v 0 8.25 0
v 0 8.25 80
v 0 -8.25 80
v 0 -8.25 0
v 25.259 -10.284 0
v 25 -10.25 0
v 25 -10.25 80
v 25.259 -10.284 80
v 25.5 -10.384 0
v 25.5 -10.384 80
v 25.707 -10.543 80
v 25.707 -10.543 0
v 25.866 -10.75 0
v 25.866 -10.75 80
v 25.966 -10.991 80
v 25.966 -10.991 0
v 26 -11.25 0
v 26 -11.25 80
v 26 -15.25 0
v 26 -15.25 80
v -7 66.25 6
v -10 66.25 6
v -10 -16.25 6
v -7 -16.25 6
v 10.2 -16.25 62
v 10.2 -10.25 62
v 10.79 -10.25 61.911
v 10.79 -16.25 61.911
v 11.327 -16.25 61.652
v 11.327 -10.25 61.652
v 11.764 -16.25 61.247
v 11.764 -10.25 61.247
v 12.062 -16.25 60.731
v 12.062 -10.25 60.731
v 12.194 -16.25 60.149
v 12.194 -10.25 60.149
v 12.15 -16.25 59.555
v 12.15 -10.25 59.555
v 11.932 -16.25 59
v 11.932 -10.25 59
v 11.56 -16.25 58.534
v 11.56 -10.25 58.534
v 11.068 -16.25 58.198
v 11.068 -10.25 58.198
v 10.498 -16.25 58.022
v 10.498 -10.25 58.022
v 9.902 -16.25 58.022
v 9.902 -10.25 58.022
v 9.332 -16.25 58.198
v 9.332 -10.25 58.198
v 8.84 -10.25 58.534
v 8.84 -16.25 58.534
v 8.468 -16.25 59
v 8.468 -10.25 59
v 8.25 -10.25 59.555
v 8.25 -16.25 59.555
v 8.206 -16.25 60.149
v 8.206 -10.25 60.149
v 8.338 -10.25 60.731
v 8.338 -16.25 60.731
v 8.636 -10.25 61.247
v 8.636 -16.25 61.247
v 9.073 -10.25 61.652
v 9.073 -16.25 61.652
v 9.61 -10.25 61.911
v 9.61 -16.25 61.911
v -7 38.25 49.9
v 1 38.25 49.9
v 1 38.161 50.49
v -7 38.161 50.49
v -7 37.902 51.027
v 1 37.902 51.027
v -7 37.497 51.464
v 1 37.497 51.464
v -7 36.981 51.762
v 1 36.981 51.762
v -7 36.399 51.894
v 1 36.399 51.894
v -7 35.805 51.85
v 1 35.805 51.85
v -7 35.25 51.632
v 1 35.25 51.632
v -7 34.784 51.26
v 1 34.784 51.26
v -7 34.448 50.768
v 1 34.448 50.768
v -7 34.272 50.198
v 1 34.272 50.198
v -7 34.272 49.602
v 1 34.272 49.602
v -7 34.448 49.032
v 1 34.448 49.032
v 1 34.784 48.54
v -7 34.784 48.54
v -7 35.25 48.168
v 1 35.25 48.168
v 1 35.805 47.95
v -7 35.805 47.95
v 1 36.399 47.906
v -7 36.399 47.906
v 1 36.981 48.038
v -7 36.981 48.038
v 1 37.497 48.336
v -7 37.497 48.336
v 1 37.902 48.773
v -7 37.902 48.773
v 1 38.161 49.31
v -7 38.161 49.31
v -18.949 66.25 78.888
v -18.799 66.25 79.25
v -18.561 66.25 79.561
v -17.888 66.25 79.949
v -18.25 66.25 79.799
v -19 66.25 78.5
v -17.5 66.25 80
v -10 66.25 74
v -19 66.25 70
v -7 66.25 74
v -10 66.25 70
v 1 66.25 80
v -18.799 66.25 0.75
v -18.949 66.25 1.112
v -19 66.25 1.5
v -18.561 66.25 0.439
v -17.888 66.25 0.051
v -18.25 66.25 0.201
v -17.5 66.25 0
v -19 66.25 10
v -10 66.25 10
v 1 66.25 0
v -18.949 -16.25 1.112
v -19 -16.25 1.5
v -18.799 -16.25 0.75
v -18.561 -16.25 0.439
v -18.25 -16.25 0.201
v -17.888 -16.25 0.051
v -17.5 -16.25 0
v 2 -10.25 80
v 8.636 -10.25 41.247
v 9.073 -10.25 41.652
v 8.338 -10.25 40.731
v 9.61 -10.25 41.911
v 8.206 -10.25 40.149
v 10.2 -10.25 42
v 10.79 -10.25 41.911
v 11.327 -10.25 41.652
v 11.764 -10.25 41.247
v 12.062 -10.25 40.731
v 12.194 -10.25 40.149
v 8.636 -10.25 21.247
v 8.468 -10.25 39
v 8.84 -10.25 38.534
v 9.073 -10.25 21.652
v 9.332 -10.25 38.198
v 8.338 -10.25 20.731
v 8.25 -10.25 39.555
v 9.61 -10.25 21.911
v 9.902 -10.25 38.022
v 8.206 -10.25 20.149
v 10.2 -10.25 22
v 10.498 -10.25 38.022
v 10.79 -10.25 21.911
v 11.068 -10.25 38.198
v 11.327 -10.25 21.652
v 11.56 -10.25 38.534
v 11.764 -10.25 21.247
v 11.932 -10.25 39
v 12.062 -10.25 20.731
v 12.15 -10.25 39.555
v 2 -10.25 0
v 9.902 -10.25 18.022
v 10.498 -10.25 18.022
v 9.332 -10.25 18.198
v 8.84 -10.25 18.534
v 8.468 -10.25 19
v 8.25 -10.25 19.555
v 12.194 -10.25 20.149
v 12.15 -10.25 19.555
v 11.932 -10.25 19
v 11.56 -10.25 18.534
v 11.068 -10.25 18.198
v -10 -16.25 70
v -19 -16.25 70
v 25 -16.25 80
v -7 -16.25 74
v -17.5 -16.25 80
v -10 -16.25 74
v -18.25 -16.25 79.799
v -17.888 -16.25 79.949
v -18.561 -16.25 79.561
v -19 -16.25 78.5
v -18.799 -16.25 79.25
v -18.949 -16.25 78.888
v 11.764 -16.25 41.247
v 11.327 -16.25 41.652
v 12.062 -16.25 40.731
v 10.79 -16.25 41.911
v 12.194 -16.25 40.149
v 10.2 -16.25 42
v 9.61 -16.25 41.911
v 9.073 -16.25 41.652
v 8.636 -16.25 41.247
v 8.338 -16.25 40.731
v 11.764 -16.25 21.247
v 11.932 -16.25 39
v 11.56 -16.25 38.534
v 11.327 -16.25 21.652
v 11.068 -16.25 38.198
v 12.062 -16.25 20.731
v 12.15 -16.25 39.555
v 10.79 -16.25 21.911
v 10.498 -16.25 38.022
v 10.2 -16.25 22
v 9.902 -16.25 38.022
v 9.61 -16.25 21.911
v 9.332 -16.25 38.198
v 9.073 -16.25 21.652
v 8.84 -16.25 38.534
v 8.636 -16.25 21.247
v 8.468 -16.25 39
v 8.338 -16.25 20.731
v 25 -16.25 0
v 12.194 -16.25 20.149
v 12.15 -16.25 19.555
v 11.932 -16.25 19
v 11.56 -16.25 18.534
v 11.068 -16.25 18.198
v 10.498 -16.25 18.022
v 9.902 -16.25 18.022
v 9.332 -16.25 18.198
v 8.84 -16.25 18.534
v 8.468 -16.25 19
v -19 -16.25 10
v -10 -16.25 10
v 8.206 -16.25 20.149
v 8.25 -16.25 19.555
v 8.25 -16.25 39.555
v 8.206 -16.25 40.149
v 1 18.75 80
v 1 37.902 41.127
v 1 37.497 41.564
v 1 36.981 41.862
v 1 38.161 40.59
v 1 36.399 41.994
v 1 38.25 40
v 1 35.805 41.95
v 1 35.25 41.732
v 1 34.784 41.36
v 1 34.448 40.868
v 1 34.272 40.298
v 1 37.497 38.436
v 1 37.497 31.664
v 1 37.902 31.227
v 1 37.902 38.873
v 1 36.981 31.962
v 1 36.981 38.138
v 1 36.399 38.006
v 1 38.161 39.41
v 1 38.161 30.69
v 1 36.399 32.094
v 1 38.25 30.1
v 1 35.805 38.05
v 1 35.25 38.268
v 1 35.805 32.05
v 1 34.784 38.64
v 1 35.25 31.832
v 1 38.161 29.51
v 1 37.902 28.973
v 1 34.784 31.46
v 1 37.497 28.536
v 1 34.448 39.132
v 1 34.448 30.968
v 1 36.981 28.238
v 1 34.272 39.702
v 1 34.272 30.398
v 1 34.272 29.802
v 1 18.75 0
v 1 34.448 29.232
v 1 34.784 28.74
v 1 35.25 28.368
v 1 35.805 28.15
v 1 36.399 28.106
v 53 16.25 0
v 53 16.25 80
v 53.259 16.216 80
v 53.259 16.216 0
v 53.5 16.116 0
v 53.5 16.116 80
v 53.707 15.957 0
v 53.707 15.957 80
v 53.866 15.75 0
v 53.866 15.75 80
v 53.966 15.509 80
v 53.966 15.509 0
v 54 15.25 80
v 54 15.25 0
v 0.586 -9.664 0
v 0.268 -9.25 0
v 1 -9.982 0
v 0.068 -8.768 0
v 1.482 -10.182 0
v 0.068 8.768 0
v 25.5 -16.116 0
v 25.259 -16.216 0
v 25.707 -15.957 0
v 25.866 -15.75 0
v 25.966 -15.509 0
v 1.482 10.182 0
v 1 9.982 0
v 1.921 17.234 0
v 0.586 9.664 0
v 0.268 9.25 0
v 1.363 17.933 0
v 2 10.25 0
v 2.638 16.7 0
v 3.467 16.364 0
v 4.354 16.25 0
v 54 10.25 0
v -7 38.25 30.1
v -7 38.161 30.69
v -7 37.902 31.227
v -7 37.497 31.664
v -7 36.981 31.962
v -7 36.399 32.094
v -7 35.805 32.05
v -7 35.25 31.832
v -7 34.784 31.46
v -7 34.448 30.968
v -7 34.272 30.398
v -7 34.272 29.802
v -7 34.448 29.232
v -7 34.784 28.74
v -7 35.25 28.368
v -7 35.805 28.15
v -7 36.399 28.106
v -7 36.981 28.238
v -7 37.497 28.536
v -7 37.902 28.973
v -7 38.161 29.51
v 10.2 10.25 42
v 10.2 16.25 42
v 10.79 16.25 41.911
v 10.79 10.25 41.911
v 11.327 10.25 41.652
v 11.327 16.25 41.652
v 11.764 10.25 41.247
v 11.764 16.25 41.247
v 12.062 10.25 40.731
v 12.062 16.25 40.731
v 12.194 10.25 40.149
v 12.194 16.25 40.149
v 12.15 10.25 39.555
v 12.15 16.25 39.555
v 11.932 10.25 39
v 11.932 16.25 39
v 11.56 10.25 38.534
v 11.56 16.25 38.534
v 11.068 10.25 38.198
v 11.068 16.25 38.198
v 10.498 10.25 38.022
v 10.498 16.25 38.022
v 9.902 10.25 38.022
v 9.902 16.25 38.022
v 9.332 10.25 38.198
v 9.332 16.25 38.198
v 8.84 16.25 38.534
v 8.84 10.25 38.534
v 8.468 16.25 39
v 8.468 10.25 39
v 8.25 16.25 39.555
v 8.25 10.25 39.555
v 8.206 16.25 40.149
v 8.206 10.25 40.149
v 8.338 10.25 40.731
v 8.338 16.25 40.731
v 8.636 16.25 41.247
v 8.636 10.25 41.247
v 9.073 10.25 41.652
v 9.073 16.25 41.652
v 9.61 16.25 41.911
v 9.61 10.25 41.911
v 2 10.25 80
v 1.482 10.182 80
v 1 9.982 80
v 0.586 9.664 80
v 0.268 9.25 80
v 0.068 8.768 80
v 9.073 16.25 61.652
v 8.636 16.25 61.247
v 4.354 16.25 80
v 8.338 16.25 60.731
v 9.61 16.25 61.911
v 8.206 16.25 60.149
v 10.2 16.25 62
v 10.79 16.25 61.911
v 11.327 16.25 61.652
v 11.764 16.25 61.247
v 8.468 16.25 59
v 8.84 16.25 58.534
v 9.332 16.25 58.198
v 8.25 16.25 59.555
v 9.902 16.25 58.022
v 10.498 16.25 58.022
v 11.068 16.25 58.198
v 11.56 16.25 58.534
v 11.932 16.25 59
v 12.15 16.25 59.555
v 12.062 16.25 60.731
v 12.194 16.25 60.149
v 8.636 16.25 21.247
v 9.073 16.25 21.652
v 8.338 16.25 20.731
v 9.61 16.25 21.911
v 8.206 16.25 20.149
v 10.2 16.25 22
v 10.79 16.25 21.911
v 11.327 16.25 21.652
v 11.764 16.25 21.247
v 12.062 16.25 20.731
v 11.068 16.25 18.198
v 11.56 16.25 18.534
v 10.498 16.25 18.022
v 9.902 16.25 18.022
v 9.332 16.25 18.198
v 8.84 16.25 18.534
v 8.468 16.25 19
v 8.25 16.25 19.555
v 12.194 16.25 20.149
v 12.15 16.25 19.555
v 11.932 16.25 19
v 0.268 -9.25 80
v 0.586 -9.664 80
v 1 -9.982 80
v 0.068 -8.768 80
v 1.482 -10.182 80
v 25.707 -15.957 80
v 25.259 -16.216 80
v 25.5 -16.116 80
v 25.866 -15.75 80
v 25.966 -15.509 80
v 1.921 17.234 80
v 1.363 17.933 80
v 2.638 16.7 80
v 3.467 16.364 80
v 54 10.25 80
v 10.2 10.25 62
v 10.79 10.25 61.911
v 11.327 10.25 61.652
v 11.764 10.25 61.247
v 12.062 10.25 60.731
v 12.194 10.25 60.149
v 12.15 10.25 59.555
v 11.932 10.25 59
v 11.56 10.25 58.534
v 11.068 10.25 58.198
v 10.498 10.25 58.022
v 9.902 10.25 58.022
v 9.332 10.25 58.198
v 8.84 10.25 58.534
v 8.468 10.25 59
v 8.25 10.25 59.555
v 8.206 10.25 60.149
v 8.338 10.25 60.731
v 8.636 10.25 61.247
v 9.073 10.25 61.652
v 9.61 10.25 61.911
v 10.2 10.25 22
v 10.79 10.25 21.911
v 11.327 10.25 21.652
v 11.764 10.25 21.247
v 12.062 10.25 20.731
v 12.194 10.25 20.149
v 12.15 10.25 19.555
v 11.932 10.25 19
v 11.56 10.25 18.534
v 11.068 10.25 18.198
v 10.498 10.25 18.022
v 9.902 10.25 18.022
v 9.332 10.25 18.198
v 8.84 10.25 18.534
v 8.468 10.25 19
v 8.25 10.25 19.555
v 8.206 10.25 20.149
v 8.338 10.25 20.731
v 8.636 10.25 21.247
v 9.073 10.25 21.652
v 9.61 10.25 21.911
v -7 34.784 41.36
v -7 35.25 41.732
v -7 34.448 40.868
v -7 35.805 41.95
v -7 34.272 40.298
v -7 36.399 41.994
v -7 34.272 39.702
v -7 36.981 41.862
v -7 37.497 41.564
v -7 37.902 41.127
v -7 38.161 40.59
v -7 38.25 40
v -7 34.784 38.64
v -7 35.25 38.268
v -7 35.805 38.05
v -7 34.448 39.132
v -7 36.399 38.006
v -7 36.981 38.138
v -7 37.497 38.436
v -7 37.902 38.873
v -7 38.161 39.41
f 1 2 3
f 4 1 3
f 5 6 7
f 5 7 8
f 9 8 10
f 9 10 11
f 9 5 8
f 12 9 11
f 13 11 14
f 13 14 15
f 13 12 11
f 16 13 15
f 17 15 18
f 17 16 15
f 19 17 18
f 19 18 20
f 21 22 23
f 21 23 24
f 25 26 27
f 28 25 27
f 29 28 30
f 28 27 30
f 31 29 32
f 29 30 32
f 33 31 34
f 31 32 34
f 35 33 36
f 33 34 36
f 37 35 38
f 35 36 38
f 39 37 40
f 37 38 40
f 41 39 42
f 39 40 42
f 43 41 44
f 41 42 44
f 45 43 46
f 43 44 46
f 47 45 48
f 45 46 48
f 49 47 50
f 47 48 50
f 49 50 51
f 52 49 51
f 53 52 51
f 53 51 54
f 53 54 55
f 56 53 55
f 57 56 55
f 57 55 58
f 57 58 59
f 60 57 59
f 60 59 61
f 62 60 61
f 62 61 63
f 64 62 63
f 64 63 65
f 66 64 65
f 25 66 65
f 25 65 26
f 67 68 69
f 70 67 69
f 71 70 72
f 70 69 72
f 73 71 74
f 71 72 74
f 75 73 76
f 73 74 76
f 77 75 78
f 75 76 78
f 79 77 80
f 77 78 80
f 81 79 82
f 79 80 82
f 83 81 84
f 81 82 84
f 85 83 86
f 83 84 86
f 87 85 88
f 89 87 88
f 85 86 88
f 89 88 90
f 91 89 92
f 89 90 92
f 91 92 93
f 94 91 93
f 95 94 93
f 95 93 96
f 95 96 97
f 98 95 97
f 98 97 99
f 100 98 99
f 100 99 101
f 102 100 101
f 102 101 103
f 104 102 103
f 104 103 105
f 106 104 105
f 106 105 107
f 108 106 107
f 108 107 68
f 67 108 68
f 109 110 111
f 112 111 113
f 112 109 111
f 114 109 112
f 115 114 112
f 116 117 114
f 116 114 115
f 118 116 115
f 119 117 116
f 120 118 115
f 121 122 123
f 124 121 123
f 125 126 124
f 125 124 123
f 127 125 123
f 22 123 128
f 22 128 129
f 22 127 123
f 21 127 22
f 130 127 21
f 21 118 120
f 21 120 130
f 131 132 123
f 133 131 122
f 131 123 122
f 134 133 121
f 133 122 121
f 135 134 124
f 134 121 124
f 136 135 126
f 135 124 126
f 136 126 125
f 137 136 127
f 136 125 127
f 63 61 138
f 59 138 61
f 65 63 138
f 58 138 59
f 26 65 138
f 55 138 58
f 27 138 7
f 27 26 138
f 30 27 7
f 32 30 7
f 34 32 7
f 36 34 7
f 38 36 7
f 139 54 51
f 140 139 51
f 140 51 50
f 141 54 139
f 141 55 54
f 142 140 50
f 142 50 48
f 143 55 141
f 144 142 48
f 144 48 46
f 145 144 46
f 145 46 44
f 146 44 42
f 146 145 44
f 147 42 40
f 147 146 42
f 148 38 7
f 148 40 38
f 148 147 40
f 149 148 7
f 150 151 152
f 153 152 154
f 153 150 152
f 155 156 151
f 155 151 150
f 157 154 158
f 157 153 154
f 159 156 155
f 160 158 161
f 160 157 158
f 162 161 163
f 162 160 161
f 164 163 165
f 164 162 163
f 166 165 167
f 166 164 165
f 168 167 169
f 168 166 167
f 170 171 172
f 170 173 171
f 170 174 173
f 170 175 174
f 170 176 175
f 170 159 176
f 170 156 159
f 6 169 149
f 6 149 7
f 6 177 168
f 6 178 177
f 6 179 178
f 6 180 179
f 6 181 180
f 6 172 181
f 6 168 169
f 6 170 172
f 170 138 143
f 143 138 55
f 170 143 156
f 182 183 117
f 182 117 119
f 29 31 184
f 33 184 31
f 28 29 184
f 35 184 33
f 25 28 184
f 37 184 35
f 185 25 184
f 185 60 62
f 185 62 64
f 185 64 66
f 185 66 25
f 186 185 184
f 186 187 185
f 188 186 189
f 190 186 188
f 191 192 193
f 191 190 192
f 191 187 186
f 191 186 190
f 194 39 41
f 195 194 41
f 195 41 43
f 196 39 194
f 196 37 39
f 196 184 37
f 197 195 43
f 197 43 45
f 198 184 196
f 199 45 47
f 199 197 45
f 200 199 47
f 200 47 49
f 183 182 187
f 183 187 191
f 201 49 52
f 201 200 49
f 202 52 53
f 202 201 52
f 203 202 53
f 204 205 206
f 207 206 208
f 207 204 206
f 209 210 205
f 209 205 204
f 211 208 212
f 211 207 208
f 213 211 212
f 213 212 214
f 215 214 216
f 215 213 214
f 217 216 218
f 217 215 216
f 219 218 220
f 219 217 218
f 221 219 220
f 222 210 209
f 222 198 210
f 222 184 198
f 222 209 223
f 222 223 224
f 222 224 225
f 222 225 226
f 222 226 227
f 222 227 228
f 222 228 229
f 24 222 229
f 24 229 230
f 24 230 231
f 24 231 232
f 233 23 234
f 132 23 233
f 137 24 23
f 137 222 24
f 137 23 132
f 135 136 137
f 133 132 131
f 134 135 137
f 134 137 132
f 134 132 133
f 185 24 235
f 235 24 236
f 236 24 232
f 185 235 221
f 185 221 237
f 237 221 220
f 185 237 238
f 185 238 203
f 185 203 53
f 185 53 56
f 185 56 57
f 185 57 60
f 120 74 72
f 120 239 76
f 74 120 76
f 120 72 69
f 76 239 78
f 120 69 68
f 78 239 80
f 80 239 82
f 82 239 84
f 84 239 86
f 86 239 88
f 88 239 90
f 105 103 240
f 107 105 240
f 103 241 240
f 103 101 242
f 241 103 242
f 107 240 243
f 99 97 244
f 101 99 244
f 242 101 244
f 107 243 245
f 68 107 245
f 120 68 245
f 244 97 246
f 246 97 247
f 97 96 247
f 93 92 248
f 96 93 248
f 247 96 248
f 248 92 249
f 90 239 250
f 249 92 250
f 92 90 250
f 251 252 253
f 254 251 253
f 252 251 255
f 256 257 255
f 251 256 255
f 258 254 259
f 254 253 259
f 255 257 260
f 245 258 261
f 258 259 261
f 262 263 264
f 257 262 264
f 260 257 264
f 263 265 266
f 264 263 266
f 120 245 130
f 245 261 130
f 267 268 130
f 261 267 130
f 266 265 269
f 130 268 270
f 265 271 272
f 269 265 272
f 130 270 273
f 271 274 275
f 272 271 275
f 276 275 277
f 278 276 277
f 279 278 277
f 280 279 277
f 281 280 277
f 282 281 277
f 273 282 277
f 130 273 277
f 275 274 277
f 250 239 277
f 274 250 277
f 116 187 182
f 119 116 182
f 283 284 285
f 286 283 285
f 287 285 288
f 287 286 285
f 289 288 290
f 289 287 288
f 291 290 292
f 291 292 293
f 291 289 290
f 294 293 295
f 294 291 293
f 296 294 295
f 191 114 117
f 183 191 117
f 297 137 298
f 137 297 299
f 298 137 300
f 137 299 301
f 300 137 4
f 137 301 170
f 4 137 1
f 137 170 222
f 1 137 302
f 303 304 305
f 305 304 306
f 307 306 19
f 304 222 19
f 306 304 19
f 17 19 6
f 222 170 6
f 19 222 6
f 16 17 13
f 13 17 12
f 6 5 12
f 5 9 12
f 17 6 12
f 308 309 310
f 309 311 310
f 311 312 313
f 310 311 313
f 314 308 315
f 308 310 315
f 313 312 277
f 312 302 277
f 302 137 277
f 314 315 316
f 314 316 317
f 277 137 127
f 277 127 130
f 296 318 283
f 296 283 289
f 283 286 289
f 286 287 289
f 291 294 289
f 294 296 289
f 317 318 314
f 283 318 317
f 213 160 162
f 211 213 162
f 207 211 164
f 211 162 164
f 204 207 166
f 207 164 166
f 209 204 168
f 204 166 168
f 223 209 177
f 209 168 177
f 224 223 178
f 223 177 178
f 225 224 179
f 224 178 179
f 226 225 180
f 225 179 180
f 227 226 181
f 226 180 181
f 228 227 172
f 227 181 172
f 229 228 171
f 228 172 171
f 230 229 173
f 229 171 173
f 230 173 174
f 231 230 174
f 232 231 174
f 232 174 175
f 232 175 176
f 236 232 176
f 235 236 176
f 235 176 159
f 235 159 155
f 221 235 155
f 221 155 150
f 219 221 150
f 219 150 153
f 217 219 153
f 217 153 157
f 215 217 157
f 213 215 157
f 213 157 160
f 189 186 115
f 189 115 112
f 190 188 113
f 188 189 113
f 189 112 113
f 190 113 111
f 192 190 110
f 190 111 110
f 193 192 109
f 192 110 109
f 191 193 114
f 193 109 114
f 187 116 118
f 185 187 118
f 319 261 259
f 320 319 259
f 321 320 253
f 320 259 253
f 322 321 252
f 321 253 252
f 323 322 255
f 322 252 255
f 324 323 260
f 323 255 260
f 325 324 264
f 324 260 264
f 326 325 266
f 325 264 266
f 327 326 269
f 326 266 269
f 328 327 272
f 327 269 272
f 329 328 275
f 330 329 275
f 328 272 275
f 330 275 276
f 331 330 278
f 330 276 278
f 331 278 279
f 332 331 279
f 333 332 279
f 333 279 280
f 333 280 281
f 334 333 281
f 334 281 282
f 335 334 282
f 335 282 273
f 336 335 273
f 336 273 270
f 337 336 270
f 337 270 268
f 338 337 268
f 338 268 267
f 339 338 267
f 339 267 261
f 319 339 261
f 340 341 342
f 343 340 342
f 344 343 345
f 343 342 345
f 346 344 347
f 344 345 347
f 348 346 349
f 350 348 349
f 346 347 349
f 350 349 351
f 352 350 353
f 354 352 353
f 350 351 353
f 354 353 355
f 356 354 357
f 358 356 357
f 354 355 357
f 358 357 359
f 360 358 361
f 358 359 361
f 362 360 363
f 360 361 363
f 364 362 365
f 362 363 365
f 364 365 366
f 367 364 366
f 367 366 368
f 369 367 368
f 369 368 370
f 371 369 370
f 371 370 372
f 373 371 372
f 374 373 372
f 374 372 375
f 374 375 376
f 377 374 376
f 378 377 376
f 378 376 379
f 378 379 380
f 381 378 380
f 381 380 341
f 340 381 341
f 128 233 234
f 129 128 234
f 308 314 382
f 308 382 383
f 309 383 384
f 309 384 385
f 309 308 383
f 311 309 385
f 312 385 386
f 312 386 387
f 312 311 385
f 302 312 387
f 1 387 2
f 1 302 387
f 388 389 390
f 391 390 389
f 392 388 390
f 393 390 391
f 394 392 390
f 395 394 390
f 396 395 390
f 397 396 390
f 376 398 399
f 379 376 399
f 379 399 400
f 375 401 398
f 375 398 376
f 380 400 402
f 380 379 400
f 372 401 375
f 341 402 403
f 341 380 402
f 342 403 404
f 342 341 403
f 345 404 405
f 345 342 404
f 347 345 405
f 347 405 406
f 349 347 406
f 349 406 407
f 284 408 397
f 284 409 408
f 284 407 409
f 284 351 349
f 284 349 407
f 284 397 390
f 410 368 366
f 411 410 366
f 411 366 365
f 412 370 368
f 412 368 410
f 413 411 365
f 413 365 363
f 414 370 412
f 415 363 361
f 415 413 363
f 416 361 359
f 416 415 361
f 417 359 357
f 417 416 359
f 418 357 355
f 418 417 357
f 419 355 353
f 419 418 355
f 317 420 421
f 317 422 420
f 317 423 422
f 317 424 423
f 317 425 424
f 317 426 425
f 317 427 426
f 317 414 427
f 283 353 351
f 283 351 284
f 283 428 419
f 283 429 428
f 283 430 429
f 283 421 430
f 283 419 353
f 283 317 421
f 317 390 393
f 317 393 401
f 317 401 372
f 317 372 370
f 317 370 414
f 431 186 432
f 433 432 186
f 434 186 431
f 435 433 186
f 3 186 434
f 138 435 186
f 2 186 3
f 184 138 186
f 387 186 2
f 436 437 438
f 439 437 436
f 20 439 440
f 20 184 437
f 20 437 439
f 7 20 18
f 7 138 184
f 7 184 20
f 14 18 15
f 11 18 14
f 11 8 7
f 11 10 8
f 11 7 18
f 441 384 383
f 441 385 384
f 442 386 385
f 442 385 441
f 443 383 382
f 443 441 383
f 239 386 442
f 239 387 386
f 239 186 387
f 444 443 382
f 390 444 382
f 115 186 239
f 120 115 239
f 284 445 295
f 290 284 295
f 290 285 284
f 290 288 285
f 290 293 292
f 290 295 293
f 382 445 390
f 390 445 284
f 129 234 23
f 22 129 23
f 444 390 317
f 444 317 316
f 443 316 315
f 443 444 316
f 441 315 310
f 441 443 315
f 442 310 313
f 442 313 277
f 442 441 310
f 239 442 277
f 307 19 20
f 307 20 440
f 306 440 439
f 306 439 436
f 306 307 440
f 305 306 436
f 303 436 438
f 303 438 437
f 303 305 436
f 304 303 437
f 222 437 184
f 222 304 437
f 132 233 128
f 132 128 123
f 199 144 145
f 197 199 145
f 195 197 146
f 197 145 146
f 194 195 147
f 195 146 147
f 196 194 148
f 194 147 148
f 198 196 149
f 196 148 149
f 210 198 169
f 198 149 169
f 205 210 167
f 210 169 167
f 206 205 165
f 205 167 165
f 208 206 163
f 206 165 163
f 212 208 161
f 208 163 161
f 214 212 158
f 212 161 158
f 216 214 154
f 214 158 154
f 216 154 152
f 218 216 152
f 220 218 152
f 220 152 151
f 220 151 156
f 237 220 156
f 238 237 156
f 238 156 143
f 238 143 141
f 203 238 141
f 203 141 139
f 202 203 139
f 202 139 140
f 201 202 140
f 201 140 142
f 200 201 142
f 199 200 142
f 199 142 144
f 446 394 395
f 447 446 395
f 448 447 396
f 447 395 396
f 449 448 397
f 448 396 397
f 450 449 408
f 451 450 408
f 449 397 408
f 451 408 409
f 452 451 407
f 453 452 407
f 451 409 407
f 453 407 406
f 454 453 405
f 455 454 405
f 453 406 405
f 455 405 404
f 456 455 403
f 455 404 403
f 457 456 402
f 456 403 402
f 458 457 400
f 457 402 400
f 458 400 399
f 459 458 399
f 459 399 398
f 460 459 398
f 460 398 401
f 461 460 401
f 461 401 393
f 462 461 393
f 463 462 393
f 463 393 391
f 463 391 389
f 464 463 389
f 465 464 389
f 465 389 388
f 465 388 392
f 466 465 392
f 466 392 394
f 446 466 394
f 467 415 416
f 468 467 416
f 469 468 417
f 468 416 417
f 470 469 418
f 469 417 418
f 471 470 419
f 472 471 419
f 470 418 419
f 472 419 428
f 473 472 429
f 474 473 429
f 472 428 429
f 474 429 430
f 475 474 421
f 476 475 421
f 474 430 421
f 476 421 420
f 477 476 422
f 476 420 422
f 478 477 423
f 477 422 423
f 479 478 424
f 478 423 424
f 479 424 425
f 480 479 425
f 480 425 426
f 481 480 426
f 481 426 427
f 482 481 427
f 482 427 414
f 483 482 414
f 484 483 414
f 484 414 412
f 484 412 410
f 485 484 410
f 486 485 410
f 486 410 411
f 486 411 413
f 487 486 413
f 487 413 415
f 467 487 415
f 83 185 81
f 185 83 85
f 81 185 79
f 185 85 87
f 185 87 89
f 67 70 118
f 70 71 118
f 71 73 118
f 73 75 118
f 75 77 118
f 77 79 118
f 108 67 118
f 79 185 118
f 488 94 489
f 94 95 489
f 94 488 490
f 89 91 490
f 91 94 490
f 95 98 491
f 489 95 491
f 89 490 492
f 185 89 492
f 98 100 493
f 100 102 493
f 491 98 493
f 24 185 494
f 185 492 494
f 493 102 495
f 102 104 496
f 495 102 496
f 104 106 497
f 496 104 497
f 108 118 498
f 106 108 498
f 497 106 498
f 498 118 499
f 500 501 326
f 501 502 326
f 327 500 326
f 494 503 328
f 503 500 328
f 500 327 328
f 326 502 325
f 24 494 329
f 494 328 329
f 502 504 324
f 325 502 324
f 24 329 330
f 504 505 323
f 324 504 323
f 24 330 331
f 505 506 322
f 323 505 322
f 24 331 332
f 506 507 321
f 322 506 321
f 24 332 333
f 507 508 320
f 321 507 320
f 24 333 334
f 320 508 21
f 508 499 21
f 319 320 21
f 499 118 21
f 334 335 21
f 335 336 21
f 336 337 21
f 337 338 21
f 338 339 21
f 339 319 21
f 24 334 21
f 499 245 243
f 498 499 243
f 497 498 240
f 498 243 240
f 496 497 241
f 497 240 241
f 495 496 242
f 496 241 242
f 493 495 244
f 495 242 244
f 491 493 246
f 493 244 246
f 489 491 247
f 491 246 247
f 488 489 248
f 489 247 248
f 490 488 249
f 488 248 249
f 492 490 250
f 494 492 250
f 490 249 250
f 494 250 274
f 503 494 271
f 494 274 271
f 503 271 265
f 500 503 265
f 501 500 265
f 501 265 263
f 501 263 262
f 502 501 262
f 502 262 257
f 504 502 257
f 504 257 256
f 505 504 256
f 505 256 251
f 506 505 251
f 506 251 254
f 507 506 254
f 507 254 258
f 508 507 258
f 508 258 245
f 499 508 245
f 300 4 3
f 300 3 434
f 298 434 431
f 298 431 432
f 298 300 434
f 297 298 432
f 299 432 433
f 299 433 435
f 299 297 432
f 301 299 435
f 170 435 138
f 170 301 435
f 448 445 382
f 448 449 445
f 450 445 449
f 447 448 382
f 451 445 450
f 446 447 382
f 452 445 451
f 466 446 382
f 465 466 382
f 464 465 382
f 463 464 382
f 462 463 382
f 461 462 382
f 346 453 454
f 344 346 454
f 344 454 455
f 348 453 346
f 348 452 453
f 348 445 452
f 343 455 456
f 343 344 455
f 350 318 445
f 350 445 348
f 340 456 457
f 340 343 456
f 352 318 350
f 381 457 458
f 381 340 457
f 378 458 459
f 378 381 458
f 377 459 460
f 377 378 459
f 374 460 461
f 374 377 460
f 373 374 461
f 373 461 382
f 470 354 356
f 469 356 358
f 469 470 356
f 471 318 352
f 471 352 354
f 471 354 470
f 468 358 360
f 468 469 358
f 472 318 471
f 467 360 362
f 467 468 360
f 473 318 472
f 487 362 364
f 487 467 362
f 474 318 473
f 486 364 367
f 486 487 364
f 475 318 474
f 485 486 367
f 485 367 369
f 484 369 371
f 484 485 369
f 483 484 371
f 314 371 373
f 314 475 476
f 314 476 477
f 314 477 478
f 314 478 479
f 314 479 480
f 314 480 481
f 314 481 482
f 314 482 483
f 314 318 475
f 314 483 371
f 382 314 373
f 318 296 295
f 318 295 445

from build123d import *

# Parameters (mm, degrees)
BOSS_EXTRUDE2_DEPTH = 80
SKETCH3_R           = 2
CUT_EXTRUDE2_DEPTH  = 80
SKETCH4_W           = 20
SKETCH4_H           = 80
BOSS_EXTRUDE3_DEPTH = 50
BOSS_EXTRUDE4_DEPTH = 80
SKETCH6_W           = 12
SKETCH6_H           = 60
CUT_EXTRUDE4_DEPTH  = 90
SKETCH7_W           = 3
SKETCH7_H           = 68
CUT_EXTRUDE5_DEPTH  = 90
SKETCH9_R           = 2
CUT_EXTRUDE6_DEPTH  = 90
SKETCH11_R          = 2
CUT_EXTRUDE7_DEPTH  = 90


with BuildPart() as part:
    # Sketch1 → Boss-Extrude2 (new body)
    with BuildSketch(Plane.XY):
        with BuildLine():
            ThreePointArc((26, -15.25), (25.707106781, -15.957106781), (25, -16.25))
            Line((25, -16.25), (-19, -16.25))
            Line((-19, -16.25), (-19, 16.25))
            Line((-19, 16.25), (4, 16.25))
            Line((4, 16.25), (53, 16.25))
            ThreePointArc((53, 16.25), (53.707106781, 15.957106781), (54, 15.25))
            Line((54, 15.25), (54, 10.25))
            Line((54, 10.25), (2, 10.25))
            ThreePointArc((2, 10.25), (0.585786438, 9.664213562), (0, 8.25))
            Line((0, 8.25), (0, -8.25))
            ThreePointArc((0, -8.25), (0.585786438, -9.664213562), (2, -10.25))
            Line((2, -10.25), (25, -10.25))
            ThreePointArc((25, -10.25), (25.707106781, -10.542893219), (26, -11.25))
            Line((26, -11.25), (26, -15.25))
        make_face()
    extrude(amount=BOSS_EXTRUDE2_DEPTH)

    # Sketch3 → Cut-Extrude2 (cut)
    with BuildSketch(Plane(origin=(0, 16.25, 0), x_dir=(1, 0, 0), z_dir=(0, 1, 0))):
        with Locations(Location((10.2, -40, 0), (0, 0, 270))):
            Circle(SKETCH3_R)
        with Locations(Location((10.2, -60, 0), (0, 0, 270))):
            Circle(SKETCH3_R)
        with Locations(Location((10.2, -20, 0), (0, 0, 270))):
            Circle(SKETCH3_R)
    extrude(amount=-CUT_EXTRUDE2_DEPTH, mode=Mode.SUBTRACT)

    # Sketch4 → Boss-Extrude3 (add)
    with BuildSketch(Plane(origin=(0, 16.25, 0), x_dir=(1, 0, 0), z_dir=(0, 1, 0))):
        with Locations((-9, -40)):
            Rectangle(SKETCH4_W, SKETCH4_H)
    extrude(amount=BOSS_EXTRUDE3_DEPTH)

    # Sketch5 → Boss-Extrude4 (add)
    with BuildSketch(Plane.XY.offset(80)):
        with BuildLine():
            ThreePointArc((4.354101966, 16.25), (2.2624519, 16.94375696), (1, 18.75))
            Line((1, 18.75), (1, 16.25))
            Line((1, 16.25), (4.354101966, 16.25))
        make_face()
    extrude(amount=-BOSS_EXTRUDE4_DEPTH)

    # Sketch6 → Cut-Extrude4 (cut)
    with BuildSketch(Plane(origin=(0, 66.25, 0), x_dir=(1, 0, 0), z_dir=(0, 1, 0))):
        with Locations((-13, -40)):
            Rectangle(SKETCH6_W, SKETCH6_H)
        with BuildLine():
            ThreePointArc((-17.5, -80), (-18.560660172, -79.560660172), (-19, -78.5))
            Line((-19, -78.5), (-19, -80))
            Line((-19, -80), (-17.5, -80))
        make_face()
        with BuildLine():
            Line((-19, 0), (-19, -1.5))
            ThreePointArc((-19, -1.5), (-18.560660172, -0.439339828), (-17.5, 0))
            Line((-17.5, 0), (-19, 0))
        make_face()
    extrude(amount=-CUT_EXTRUDE4_DEPTH, mode=Mode.SUBTRACT)

    # Sketch7 → Cut-Extrude5 (cut)
    with BuildSketch(Plane(origin=(0, 66.25, 0), x_dir=(1, 0, 0), z_dir=(0, 1, 0))):
        with Locations((-8.5, -40)):
            Rectangle(SKETCH7_W, SKETCH7_H)
    extrude(amount=-CUT_EXTRUDE5_DEPTH, mode=Mode.SUBTRACT)

    # Sketch9 → Cut-Extrude6 (cut)
    with BuildSketch(Plane(origin=(1, 0, 0), x_dir=(0, 0, -1), z_dir=(1, 0, 0))):
        with Locations(Location((-49.9, 36.25, 0), (0, 0, 90))):
            Circle(SKETCH9_R)
        with Locations(Location((-30.1, 36.25, 0), (0, 0, 90))):
            Circle(SKETCH9_R)
    extrude(amount=-CUT_EXTRUDE6_DEPTH, mode=Mode.SUBTRACT)

    # Sketch11 → Cut-Extrude7 (cut)
    with BuildSketch(Plane(origin=(1, 0, 0), x_dir=(0, 0, -1), z_dir=(1, 0, 0))):
        with Locations(Location((-40, 36.25, 0), (0, 0, 90))):
            Circle(SKETCH11_R)
    extrude(amount=-CUT_EXTRUDE7_DEPTH, mode=Mode.SUBTRACT)


solid = part.part
